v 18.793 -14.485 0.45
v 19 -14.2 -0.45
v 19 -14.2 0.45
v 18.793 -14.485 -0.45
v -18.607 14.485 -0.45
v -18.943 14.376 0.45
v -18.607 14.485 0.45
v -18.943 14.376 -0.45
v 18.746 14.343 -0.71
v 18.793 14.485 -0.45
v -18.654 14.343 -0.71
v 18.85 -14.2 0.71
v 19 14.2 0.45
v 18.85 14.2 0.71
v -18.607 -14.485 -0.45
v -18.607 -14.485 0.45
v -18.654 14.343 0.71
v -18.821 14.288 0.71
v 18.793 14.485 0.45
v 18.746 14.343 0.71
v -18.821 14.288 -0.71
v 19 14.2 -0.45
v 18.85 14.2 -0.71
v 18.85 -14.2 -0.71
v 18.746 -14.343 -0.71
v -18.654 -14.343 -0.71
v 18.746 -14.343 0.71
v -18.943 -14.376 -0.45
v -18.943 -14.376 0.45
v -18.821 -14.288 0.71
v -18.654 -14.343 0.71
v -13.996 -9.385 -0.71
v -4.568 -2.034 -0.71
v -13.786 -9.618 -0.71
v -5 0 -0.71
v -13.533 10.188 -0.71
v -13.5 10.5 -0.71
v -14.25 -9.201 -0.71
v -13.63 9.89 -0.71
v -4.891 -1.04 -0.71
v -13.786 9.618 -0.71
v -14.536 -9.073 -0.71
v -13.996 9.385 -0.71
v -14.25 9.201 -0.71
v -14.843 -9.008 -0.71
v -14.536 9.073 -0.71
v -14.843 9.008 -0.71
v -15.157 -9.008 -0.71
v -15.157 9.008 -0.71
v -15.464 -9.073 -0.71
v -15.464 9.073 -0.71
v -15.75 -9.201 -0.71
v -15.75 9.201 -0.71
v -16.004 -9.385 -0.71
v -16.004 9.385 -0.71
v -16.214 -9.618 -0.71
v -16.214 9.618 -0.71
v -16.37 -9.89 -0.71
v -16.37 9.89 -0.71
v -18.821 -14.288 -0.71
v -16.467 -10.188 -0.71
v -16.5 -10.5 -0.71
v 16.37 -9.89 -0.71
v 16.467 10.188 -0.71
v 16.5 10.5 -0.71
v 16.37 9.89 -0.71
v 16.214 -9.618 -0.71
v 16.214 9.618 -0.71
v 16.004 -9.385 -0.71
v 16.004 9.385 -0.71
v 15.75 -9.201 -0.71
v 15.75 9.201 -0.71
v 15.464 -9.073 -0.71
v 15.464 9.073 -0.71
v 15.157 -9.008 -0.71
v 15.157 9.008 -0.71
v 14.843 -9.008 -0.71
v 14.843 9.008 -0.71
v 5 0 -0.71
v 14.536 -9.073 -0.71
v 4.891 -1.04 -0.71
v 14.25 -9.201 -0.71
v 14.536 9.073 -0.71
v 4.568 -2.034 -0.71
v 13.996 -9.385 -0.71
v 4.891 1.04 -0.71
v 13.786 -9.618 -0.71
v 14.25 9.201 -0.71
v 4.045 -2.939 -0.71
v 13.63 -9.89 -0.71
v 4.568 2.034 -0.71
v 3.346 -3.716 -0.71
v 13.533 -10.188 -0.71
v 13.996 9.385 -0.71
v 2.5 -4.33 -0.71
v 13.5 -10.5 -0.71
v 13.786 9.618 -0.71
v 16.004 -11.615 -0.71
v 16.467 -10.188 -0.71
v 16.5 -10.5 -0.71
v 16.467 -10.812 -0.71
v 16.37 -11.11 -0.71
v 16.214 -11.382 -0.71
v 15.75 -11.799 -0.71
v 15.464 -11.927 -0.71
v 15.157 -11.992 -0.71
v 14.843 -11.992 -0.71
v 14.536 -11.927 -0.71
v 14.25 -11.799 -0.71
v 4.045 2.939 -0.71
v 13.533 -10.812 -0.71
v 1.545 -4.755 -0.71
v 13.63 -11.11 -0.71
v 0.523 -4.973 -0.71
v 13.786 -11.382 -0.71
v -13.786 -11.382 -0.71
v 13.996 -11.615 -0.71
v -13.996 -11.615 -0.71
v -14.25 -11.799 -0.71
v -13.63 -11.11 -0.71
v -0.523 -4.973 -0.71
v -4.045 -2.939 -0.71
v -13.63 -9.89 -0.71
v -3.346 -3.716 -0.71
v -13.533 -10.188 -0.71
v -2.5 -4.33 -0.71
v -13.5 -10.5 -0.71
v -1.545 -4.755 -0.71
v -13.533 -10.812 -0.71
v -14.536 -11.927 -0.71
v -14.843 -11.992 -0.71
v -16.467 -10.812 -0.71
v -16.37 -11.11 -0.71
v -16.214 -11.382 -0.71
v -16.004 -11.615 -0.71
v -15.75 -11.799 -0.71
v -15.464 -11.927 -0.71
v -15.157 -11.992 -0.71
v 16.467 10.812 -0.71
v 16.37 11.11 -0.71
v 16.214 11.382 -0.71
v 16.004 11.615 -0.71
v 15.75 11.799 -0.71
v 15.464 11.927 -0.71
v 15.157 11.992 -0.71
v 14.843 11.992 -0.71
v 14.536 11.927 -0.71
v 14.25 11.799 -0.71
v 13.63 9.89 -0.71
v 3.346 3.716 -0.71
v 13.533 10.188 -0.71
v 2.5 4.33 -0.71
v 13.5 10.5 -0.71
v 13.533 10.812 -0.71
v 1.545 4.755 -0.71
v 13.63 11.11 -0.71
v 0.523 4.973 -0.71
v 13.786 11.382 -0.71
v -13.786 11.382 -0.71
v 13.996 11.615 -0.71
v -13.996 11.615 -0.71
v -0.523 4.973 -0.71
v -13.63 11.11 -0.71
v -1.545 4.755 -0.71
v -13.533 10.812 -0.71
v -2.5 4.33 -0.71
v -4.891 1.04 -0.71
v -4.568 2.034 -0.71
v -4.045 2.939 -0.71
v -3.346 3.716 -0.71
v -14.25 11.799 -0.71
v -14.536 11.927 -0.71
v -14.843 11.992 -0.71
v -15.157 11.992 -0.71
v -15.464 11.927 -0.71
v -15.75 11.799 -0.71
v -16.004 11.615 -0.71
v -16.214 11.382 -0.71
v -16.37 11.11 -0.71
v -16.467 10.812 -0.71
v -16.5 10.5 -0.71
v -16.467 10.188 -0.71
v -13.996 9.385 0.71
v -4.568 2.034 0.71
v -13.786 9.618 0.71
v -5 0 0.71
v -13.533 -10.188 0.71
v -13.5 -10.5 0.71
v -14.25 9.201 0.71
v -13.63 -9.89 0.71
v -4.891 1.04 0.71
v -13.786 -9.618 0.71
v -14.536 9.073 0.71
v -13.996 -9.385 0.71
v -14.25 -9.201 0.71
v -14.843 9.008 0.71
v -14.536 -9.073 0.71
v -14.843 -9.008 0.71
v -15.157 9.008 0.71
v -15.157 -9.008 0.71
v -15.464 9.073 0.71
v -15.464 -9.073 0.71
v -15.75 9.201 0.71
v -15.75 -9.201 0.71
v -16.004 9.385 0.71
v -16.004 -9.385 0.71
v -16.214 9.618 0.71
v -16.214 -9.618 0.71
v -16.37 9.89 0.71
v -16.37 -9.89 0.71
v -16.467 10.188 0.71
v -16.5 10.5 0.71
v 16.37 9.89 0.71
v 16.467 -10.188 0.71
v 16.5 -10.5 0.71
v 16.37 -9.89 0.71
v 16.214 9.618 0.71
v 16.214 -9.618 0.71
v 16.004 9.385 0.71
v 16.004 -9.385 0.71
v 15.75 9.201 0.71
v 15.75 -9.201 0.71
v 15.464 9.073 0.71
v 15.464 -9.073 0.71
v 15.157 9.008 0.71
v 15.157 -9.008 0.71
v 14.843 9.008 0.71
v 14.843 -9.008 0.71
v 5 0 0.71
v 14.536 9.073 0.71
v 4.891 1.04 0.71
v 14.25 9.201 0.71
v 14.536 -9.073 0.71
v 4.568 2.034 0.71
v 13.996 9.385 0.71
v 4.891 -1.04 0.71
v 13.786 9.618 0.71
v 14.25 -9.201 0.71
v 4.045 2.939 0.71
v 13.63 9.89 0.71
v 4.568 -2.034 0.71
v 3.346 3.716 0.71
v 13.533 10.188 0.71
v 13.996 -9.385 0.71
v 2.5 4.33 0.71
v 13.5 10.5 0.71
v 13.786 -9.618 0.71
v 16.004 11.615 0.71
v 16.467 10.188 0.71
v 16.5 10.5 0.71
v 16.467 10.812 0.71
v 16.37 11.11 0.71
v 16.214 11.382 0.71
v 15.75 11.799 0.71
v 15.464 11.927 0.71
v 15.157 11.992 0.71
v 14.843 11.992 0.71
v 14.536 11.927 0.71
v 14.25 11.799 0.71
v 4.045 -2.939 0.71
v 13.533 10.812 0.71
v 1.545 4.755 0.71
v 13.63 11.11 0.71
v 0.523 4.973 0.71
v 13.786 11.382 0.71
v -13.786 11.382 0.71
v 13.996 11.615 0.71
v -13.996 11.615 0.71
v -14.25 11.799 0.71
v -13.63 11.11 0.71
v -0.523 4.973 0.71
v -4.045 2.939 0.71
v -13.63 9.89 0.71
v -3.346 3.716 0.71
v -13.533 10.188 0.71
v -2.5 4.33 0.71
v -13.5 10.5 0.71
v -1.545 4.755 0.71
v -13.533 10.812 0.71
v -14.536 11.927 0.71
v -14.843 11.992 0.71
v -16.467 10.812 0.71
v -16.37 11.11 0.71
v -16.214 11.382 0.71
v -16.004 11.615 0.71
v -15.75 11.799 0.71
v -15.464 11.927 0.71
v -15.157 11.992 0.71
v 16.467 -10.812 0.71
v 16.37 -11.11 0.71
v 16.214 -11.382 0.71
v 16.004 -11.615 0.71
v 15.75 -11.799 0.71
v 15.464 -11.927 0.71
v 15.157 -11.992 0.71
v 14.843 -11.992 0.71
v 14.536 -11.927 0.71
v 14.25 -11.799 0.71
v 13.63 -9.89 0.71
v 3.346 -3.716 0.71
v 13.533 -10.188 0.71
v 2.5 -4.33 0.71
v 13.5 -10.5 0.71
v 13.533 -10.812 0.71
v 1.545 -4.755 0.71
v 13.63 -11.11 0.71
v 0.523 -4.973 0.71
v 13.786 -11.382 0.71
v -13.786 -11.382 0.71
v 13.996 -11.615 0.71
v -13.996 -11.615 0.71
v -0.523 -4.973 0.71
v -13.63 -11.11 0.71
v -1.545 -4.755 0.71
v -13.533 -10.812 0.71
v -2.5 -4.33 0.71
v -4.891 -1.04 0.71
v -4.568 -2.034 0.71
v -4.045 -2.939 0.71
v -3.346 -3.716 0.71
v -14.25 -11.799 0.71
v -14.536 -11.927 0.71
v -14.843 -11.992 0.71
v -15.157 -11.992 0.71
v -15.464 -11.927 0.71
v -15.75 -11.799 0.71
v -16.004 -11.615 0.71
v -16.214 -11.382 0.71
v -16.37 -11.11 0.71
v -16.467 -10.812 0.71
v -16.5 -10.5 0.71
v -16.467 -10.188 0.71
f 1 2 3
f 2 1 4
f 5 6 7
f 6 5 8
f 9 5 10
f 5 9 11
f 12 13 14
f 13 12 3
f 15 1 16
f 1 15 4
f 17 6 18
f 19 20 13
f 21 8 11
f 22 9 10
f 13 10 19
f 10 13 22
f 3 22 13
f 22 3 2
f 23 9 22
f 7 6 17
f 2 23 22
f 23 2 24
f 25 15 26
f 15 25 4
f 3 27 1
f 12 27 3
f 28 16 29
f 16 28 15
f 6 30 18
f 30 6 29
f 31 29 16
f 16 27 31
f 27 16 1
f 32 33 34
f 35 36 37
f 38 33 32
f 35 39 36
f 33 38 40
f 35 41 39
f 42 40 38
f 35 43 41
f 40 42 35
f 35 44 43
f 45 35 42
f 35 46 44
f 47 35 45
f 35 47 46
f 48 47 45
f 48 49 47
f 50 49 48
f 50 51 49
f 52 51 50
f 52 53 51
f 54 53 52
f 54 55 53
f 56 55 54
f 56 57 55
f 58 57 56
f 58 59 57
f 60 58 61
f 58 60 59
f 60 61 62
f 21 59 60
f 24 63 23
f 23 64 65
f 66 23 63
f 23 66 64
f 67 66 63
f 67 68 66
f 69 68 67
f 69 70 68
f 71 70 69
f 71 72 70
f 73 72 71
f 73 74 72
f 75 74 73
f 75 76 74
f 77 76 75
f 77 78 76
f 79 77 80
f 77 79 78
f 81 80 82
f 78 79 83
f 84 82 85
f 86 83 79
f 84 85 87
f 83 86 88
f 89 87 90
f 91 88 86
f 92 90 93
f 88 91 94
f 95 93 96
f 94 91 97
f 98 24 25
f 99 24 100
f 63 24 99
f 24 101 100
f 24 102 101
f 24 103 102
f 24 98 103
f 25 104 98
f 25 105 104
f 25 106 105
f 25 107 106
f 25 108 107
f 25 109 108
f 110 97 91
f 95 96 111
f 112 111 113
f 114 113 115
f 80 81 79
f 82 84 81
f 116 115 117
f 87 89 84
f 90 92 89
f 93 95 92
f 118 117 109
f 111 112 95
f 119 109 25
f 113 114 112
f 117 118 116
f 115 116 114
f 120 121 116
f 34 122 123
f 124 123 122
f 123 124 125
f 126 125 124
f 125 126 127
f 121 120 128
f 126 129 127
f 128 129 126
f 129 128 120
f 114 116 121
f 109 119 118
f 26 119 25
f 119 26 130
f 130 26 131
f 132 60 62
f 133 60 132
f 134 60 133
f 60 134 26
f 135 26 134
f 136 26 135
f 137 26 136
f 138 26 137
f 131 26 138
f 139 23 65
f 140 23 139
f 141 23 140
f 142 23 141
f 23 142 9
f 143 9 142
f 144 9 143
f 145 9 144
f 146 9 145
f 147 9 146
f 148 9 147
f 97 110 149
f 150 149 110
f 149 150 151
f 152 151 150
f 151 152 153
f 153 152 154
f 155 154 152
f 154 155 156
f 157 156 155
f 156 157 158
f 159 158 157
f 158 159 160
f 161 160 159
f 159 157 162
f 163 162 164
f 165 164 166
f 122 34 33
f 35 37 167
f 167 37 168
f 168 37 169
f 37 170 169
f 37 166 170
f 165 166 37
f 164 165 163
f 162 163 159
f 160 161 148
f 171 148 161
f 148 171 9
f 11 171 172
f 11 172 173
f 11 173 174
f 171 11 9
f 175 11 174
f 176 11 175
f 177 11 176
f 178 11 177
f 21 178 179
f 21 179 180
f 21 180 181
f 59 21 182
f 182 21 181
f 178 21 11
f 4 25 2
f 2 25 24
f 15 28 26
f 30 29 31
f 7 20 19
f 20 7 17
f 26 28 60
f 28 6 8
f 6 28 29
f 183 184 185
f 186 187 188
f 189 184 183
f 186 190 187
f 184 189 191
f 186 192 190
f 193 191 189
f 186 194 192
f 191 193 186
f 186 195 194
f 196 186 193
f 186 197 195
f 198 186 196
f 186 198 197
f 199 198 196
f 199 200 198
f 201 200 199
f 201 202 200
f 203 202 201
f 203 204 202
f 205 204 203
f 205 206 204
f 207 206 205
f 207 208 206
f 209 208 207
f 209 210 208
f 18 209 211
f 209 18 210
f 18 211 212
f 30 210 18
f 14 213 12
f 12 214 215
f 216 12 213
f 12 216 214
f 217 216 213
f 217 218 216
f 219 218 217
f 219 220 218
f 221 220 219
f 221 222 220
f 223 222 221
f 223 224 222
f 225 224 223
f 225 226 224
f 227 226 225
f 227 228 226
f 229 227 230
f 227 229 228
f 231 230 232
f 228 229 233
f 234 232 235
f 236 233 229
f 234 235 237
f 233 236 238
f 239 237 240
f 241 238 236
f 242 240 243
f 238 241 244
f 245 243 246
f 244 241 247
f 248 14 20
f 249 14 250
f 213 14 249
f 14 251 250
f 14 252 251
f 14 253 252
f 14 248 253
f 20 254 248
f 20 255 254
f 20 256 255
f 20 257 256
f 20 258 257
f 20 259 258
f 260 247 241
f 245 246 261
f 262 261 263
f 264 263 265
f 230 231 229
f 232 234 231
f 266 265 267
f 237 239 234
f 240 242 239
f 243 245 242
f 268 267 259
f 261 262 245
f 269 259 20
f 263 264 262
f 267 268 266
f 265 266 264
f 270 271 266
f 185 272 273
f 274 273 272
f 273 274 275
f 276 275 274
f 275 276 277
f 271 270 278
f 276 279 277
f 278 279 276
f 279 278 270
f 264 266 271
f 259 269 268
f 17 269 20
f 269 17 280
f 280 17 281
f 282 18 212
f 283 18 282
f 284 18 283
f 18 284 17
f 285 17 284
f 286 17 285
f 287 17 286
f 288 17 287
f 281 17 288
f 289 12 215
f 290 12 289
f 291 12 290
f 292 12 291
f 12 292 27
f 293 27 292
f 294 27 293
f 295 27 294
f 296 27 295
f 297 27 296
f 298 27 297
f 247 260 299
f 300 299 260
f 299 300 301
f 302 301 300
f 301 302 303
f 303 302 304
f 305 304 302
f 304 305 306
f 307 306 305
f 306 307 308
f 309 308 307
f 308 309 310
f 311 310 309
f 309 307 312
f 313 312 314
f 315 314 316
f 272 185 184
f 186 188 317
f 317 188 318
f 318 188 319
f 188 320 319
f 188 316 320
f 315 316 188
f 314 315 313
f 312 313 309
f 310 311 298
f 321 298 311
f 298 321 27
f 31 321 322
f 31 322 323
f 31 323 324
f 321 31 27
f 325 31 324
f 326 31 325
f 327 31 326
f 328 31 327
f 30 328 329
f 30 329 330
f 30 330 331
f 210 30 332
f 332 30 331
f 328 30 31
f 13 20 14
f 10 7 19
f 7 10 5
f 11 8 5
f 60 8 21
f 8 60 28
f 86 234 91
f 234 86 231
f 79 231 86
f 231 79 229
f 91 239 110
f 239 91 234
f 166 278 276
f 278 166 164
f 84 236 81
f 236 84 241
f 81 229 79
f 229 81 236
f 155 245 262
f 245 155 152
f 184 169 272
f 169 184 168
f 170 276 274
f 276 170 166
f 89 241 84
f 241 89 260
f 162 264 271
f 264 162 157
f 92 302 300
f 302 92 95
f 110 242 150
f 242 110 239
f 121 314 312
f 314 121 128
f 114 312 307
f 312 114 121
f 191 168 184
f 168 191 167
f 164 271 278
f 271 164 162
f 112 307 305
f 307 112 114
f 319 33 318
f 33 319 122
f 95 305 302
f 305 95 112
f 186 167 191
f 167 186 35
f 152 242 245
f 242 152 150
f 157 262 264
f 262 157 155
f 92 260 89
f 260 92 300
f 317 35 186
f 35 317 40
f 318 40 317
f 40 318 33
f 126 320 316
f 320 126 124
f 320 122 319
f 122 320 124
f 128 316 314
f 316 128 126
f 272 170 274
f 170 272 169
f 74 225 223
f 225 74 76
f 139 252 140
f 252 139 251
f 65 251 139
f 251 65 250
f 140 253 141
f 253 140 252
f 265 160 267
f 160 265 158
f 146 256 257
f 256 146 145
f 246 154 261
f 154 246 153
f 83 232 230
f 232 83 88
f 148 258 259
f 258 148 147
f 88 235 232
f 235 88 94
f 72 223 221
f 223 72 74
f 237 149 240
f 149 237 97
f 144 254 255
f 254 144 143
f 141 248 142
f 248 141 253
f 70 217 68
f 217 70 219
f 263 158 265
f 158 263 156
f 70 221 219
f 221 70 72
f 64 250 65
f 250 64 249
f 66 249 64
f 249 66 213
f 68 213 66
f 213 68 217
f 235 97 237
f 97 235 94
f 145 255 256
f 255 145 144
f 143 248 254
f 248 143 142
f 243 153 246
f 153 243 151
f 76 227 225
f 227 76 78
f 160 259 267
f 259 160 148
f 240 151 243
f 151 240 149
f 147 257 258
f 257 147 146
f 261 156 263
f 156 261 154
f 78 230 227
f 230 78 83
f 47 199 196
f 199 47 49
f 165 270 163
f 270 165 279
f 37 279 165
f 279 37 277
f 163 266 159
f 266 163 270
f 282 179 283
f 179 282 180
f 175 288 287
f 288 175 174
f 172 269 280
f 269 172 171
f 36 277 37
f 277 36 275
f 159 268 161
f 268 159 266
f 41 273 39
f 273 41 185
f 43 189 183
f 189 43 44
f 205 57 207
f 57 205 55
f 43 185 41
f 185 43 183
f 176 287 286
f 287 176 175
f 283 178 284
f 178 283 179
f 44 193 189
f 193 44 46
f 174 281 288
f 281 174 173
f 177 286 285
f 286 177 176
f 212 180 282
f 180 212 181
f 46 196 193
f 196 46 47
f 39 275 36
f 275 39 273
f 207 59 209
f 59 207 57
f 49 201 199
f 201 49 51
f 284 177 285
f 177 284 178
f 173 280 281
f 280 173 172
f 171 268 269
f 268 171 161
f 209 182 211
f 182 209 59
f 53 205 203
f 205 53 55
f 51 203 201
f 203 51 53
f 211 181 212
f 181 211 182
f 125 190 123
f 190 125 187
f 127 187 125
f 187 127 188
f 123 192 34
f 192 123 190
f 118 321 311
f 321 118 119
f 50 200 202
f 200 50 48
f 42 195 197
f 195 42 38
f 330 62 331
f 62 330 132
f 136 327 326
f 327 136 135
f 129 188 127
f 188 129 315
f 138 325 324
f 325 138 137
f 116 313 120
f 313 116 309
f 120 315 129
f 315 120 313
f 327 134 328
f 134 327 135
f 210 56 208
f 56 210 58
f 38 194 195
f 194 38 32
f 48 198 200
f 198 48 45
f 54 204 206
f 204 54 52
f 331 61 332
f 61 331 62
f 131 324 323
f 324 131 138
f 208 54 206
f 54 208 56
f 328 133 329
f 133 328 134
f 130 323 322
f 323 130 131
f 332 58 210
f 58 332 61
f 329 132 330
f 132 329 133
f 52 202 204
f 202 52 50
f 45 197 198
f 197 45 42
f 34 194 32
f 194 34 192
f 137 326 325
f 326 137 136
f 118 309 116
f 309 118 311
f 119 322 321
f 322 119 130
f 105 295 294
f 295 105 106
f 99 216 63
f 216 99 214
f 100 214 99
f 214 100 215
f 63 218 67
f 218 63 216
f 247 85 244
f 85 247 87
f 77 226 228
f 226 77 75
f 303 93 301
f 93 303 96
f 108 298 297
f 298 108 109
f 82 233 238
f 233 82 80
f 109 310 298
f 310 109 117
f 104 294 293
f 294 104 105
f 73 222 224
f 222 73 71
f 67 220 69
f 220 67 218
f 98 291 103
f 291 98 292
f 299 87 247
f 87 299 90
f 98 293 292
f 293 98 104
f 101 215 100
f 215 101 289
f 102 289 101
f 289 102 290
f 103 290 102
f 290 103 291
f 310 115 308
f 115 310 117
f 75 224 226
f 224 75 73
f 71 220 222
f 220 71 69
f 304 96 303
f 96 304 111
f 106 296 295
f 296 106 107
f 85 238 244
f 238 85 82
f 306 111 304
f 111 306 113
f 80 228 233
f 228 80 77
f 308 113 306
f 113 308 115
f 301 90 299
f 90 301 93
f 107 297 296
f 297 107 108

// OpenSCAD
// file: lib.scad
module hull_box(l,w,h,c, center=true)
{	
    translate([center ? 0 : l/2, center ? 0 : w/2, center ? 0 : h/2]) 
	hull() {
        translate([-l/2+c, -w/2+c, -h/2+c]) sphere(r=c);
        translate([ l/2-c, -w/2+c, -h/2+c]) sphere(r=c);
        translate([ l/2-c,  w/2-c, -h/2+c]) sphere(r=c);
        translate([-l/2+c,  w/2-c, -h/2+c]) sphere(r=c);
        translate([-l/2+c, -w/2+c,  h/2-c]) sphere(r=c);
        translate([ l/2-c, -w/2+c,  h/2-c]) sphere(r=c);
        translate([ l/2-c,  w/2-c,  h/2-c]) sphere(r=c);
        translate([-l/2+c,  w/2-c,  h/2-c]) sphere(r=c);
    }
}

module wedge(l,w,h1,h2) {
    hull() {
        translate([0,(l-h1)/2,0])
            rotate([0,90,0]) cylinder(d=h1, h=w, center=true);
        translate([0,-l*0.45,0])
            cube([w,l*0.1,h2], center=true);
    }
}

module hang(l1,l2,l3,w,t) {
    translate([0,l2/2-t/2,-l1/2]) rotate([90,0,0]) cube([w,l1,t], center=true);
    cube([w,l2,t], center=true);
    translate([0,-l2/2+t/2,-l3/2]) rotate([90,0,0]) cube([w,l3,t], center=true);
}

module hook(hd,hl,e,a=180,s=true) {
    cylinder(d=hd, h=hl, $fn=15);
    translate([0,-e,0])
	rotate([270,0,0]) rotate([0,90,0])
	    rotate_extrude(angle=a)
		translate([e, 0, 0]) 
		    circle(d=hd, $fn=15);
    if (s) {
	translate([0,0,hl])
	    sphere(d=hd);
	translate([0,-e*2,0])
	    sphere(d=hd);
    }
}

module rope_lock(l, h, di1, do1, di2, do2) {
	difference() {
		hull() {
			cylinder(d=do1, h=h);
			translate([l-(do1+do2)/2,0,0])
				cylinder(d=do2, h=h);
		}
	translate([0,0,-0.5])
		cylinder(d=di1, h=h+1);
	translate([l-(do1+do2)/2,0,-0.5])
		cylinder(d=di2, h=h+1);
	}
}

module rope_hook(l, h, di1, do1, di2, do2, a=30) {
	difference() {
		rope_lock(l, h, di1, do1, di2, do2);
		rotate([0,0,a]) translate([l/2,0,h/2])
			cube([l,di1/2,h+1], center=true);
	}
}

module hinge_unit(p,d,l,w,h) {
    difference() {
        intersection() {
            cube([l,w,h], center=true);
            union() {
                translate([p,0,0]) rotate([90,0,0]) cylinder(d=(l/2-p)*2,h=2*w, center=true);
                translate([-l/2,-w,-h/2]) cube([l/2+p,w*2,h]);
            }
        }
        translate([p,0,0]) rotate([90,0,0]) cylinder(d=d,h=2*w, center=true, $fn=15);
    }
}

module hinge_n(p,d,l,w,h,j=0.2, n=1, base_h=0) {
    translate([0,(l-base_h)/2,0])
        cube([(2*n-1)*(w+j),base_h,h], center=true);
	translate([-(n-1)*(w+j),0,0]) for (i = [0 : n-1] ) {
		translate([ 2*i*(w+j), 0, 0]) rotate([0,0,270]) hinge_unit(p,d,l,w,h);
	}
}

module hinge_join(p,d,l,w,h,j=0,base_h=0, n1=2, n2=3, ecart=0, angle=0, cutf=1.2)
{
    translate([0,-ecart,0]) rotate([-angle/2,0,0]) difference()
    {
      hinge_n(p,d,l,w,h,j,n1, base_h);
      translate([0,(ecart+l-p)/2,0]) rotate([0,90,0])
        cylinder(d=h*cutf, h=(n1+j)*2*w, center=true);
    }
    translate([0,ecart,0]) rotate([-angle/2,0,180])  difference()
    {
      hinge_n(p,d,l,w,h,j,n2, base_h);
      translate([0,(ecart+l-p)/2,0]) rotate([0,90,0])
        cylinder(d=h*cutf, h=(n2+j)*2*w, center=true);
    }
}

module hinge_lock(hd,hl,e,j=0.2, endlock=true) {
    cylinder(d=hd-j, h=hl, center=true, $fn=15);
    translate([-e,0,hl/2]) rotate([90,0,0]) rotate_extrude(angle=180, $fn=15)
       translate([e, 0, 0]) circle(d=hd-j);
    translate([-2*e,0,0]) rotate([0,0,0]) cylinder(d=hd-j, h=hl, center=true, $fn=15);
    translate([-e,0,-hl/2]) rotate([90,0,0]) rotate_extrude(angle=90, $fn=15)
       translate([-e, 0, 0]) circle(d=hd-j);
	if (endlock) {
		translate([-e/2,0,-hl/2-hd]) rotate([0,90,0]) cylinder(d=hd-j, h=hl/4, center=true, $fn=15);
	}
}

module grip(l, d, f=1.2, t=0.5, dg=0, dh=1, dfl=1, center=true) {
    difference() {
        hull() {
            cylinder(h=l, d=d*f, center=center);
            if (dg != 0) {
                translate([dg + (t>0 ? 1 : -1) * (center ? d/2 : 0), 0, 0])
#                    cylinder(h=l*dfl, d=dh, center=center);
            }
        }
        cylinder(h=l*1.1, d=d, center=center);
        translate([d*f*t, 0, 0])
            cube([d*f,d*f,l*1.1], center=center);
    }
}

module angle_hold(a,r,l,t,d, f=1.2, dt=0.67, fl=1, dg=0, dh=1, dfl=1) {
    difference() {
        rotate_extrude(angle=a)
            translate([r, 0, 0]) square([l,t], center=true);
        rotate([90,0,90-0.5])
            translate([0,0,r]) cylinder(h=l*f, d=d*f, center=true);
        rotate([90,0,90+a+0.5])
            translate([0,0,r]) cylinder(h=l*f, d=d*f, center=true);
    }
    rotate([90,0,90])
        translate([0,0,r*0.995]) grip(l=l*fl, d=d, f=f, t=-dt, dg=dg, dh=dh, dfl=dfl);
    rotate([90,0,90+a])
        translate([0,0,r*0.995]) grip(l=l*fl, d=d, f=f, t=dt, dg=-dg, dh=dh, dfl=dfl);
}

module tube_lock(hinge_p, hinge_d, hinge_l, hinge_w, hinge_h, grip_l, grip_d, n=1, flat=true, f_grip=1.2) {
    difference() {
        union() {
            grip(grip_l, grip_d, f_grip);
            translate([flat?-hinge_w/2:0,-(hinge_l+grip_d)/2,0]) 
                rotate([0, flat?0:90, 0])
                    hinge_n(hinge_p,hinge_d,hinge_l,hinge_w,hinge_h, n=n);
            translate([flat?-hinge_w/2:0,(hinge_l+grip_d)/2,0]) rotate([0,0,180])
                rotate([0, flat?0:90, 0])
                    hinge_n(hinge_p,hinge_d,hinge_l,hinge_w,hinge_h, n=n);
        }
        if(!flat) {
            translate([grip_d/2,0,0])
                cube([grip_d,grip_d*f_grip,grip_l], center=true);
        }
    }
}

module cylinder_groove_lock(d1,h1,d2,h2) {
    cylinder(d=d2,h=h2, $fn=30);
    translate([0,0,h2*0.95])
	cylinder(d=d1,h=h1, $fn=30);
}

module sphere_hold(d,e,j,d1,a1,d2,a2) {
    difference() {
        sphere(d=d+e);
        sphere(d=d+j);
        rotate([0,a1,0]) translate([d1,0,0])
#            cube([d+e+j,d+e+j,d+e+j], center=true);
        rotate([0,a2,0]) translate([d2,0,0])
#            cube([d+e+j,d+e+j,d+e+j], center=true);
    }
}

module sphere_magnet_hold(d,e,c,j,d1,a1,d2,a2) {
    difference() {
        sphere_hold(d,e,j,d1,a1,d2,a2);
        translate([-(d+c)/2,0,0])
#            cube([c+j,c+j,c+j], center=true);
    }
}

module sphere_hinge_hold(d,e,j,d1,a1,d2,a2,hp,hd,hl,hw,hh,hn=3,ah=0,av=0) {
	sphere_hold(d,e,j,d1,a1,d2,a2);
	rotate([0,ah,0]) 
		translate([-(d+hl)*0.49,0,0]) 
			rotate([0,av,-90])
				hinge_n(hp,hd,hl,hw,hh, n=hn, base_h=e*1.5);
}


module stepper_tool(d=6, h=10, j=0) {
	translate([0,0,-h]) difference() {
		cylinder(d=d, h=h, $fn=60);
		translate([0,0,h-9])
			intersection() {
				cylinder(d=5.5+j, h=10, $fn=15);
				translate([0, 0, (h+2)/2]) 
					cube([3+j, 10, 12], center=true);
			}
		translate([0, 0, h-3])
			rotate([90, 0, 90])
				cylinder(d=3, h=d*1.1, $fn=15, center=true);
	}
}

module stepper_tool_base(d=6, h=10, j=0, base_d=12, base_h=3) {
	stepper_tool(d, h, j);
	translate([0,0,base_h/2]) difference() {
		cylinder(d=base_d, h=base_h, center=true, $fn=60);
		cylinder(d=5.5+j, h=base_h+3, center=true, $fn=60);
		translate([0,0,1])
			cylinder(d=10+j, h=base_h-1, center=true, $fn=60);
	}
}

module wheel(d, h, n_hole, n_grip=0, groove_d=0) {
    difference() {
        union() {
            for(i = [0:n_grip]) {
                rotate([0, 0, i * 360 / n_grip])
                translate([d / 2, 0, 0])
        			cylinder(d=360/(3*n_grip), h=h, $fn=9, center=true);
            }
            cylinder(d=d, h=h, $fn=120, center=true);
        }
	    rotate_extrude(angle=360)
			translate([d/2, 0, 0]) 
#				circle(d=groove_d, $fn=4);
        for(i = [0:n_hole]) {
            rotate([0, 0, i*360/n_hole]) hull() {
                translate([d/6, 0, 0])
                cylinder(d=d/(n_hole+1), h=h*1.1, $fn=30, center=true);
                translate([d/2.2 - d/(n_hole+1), 0, 0])
                cylinder(d=d*2/(n_hole+1), h=h*1.1, $fn=30, center=true);
            }
        }
    }
}

module molette(d, h, d_grip, n_grip=3) {
	hull() {
		for(i = [0:n_grip]){
			rotate([0, 0, i * 360 / n_grip])
			translate([d_molette / 2, 0, 0])
				cylinder(d=d_grip, h=h);
		}
	}
}
// main file
include <lib.scad>

l=38;
w=29;
h=1.5;
d_vis=3;
dl_vis=4;
dw_vis=4;
d_jack=10;


difference() {
    hull_box(l,w,h,0.3, center=true);
    cylinder(d=d_jack, h=h*2, center=true, $fn=30);
    translate([ l/2-dl_vis, w/2-dw_vis, 0])
        cylinder(d=d_vis, h=h*2, center=true, $fn=30);
    translate([-l/2+dl_vis, w/2-dw_vis, 0])
        cylinder(d=d_vis, h=h*2, center=true, $fn=30);
    translate([-l/2+dl_vis,-w/2+dw_vis, 0])
        cylinder(d=d_vis, h=h*2, center=true, $fn=30);
    translate([ l/2-dl_vis,-w/2+dw_vis, 0])
        cylinder(d=d_vis, h=h*2, center=true, $fn=30);
}
